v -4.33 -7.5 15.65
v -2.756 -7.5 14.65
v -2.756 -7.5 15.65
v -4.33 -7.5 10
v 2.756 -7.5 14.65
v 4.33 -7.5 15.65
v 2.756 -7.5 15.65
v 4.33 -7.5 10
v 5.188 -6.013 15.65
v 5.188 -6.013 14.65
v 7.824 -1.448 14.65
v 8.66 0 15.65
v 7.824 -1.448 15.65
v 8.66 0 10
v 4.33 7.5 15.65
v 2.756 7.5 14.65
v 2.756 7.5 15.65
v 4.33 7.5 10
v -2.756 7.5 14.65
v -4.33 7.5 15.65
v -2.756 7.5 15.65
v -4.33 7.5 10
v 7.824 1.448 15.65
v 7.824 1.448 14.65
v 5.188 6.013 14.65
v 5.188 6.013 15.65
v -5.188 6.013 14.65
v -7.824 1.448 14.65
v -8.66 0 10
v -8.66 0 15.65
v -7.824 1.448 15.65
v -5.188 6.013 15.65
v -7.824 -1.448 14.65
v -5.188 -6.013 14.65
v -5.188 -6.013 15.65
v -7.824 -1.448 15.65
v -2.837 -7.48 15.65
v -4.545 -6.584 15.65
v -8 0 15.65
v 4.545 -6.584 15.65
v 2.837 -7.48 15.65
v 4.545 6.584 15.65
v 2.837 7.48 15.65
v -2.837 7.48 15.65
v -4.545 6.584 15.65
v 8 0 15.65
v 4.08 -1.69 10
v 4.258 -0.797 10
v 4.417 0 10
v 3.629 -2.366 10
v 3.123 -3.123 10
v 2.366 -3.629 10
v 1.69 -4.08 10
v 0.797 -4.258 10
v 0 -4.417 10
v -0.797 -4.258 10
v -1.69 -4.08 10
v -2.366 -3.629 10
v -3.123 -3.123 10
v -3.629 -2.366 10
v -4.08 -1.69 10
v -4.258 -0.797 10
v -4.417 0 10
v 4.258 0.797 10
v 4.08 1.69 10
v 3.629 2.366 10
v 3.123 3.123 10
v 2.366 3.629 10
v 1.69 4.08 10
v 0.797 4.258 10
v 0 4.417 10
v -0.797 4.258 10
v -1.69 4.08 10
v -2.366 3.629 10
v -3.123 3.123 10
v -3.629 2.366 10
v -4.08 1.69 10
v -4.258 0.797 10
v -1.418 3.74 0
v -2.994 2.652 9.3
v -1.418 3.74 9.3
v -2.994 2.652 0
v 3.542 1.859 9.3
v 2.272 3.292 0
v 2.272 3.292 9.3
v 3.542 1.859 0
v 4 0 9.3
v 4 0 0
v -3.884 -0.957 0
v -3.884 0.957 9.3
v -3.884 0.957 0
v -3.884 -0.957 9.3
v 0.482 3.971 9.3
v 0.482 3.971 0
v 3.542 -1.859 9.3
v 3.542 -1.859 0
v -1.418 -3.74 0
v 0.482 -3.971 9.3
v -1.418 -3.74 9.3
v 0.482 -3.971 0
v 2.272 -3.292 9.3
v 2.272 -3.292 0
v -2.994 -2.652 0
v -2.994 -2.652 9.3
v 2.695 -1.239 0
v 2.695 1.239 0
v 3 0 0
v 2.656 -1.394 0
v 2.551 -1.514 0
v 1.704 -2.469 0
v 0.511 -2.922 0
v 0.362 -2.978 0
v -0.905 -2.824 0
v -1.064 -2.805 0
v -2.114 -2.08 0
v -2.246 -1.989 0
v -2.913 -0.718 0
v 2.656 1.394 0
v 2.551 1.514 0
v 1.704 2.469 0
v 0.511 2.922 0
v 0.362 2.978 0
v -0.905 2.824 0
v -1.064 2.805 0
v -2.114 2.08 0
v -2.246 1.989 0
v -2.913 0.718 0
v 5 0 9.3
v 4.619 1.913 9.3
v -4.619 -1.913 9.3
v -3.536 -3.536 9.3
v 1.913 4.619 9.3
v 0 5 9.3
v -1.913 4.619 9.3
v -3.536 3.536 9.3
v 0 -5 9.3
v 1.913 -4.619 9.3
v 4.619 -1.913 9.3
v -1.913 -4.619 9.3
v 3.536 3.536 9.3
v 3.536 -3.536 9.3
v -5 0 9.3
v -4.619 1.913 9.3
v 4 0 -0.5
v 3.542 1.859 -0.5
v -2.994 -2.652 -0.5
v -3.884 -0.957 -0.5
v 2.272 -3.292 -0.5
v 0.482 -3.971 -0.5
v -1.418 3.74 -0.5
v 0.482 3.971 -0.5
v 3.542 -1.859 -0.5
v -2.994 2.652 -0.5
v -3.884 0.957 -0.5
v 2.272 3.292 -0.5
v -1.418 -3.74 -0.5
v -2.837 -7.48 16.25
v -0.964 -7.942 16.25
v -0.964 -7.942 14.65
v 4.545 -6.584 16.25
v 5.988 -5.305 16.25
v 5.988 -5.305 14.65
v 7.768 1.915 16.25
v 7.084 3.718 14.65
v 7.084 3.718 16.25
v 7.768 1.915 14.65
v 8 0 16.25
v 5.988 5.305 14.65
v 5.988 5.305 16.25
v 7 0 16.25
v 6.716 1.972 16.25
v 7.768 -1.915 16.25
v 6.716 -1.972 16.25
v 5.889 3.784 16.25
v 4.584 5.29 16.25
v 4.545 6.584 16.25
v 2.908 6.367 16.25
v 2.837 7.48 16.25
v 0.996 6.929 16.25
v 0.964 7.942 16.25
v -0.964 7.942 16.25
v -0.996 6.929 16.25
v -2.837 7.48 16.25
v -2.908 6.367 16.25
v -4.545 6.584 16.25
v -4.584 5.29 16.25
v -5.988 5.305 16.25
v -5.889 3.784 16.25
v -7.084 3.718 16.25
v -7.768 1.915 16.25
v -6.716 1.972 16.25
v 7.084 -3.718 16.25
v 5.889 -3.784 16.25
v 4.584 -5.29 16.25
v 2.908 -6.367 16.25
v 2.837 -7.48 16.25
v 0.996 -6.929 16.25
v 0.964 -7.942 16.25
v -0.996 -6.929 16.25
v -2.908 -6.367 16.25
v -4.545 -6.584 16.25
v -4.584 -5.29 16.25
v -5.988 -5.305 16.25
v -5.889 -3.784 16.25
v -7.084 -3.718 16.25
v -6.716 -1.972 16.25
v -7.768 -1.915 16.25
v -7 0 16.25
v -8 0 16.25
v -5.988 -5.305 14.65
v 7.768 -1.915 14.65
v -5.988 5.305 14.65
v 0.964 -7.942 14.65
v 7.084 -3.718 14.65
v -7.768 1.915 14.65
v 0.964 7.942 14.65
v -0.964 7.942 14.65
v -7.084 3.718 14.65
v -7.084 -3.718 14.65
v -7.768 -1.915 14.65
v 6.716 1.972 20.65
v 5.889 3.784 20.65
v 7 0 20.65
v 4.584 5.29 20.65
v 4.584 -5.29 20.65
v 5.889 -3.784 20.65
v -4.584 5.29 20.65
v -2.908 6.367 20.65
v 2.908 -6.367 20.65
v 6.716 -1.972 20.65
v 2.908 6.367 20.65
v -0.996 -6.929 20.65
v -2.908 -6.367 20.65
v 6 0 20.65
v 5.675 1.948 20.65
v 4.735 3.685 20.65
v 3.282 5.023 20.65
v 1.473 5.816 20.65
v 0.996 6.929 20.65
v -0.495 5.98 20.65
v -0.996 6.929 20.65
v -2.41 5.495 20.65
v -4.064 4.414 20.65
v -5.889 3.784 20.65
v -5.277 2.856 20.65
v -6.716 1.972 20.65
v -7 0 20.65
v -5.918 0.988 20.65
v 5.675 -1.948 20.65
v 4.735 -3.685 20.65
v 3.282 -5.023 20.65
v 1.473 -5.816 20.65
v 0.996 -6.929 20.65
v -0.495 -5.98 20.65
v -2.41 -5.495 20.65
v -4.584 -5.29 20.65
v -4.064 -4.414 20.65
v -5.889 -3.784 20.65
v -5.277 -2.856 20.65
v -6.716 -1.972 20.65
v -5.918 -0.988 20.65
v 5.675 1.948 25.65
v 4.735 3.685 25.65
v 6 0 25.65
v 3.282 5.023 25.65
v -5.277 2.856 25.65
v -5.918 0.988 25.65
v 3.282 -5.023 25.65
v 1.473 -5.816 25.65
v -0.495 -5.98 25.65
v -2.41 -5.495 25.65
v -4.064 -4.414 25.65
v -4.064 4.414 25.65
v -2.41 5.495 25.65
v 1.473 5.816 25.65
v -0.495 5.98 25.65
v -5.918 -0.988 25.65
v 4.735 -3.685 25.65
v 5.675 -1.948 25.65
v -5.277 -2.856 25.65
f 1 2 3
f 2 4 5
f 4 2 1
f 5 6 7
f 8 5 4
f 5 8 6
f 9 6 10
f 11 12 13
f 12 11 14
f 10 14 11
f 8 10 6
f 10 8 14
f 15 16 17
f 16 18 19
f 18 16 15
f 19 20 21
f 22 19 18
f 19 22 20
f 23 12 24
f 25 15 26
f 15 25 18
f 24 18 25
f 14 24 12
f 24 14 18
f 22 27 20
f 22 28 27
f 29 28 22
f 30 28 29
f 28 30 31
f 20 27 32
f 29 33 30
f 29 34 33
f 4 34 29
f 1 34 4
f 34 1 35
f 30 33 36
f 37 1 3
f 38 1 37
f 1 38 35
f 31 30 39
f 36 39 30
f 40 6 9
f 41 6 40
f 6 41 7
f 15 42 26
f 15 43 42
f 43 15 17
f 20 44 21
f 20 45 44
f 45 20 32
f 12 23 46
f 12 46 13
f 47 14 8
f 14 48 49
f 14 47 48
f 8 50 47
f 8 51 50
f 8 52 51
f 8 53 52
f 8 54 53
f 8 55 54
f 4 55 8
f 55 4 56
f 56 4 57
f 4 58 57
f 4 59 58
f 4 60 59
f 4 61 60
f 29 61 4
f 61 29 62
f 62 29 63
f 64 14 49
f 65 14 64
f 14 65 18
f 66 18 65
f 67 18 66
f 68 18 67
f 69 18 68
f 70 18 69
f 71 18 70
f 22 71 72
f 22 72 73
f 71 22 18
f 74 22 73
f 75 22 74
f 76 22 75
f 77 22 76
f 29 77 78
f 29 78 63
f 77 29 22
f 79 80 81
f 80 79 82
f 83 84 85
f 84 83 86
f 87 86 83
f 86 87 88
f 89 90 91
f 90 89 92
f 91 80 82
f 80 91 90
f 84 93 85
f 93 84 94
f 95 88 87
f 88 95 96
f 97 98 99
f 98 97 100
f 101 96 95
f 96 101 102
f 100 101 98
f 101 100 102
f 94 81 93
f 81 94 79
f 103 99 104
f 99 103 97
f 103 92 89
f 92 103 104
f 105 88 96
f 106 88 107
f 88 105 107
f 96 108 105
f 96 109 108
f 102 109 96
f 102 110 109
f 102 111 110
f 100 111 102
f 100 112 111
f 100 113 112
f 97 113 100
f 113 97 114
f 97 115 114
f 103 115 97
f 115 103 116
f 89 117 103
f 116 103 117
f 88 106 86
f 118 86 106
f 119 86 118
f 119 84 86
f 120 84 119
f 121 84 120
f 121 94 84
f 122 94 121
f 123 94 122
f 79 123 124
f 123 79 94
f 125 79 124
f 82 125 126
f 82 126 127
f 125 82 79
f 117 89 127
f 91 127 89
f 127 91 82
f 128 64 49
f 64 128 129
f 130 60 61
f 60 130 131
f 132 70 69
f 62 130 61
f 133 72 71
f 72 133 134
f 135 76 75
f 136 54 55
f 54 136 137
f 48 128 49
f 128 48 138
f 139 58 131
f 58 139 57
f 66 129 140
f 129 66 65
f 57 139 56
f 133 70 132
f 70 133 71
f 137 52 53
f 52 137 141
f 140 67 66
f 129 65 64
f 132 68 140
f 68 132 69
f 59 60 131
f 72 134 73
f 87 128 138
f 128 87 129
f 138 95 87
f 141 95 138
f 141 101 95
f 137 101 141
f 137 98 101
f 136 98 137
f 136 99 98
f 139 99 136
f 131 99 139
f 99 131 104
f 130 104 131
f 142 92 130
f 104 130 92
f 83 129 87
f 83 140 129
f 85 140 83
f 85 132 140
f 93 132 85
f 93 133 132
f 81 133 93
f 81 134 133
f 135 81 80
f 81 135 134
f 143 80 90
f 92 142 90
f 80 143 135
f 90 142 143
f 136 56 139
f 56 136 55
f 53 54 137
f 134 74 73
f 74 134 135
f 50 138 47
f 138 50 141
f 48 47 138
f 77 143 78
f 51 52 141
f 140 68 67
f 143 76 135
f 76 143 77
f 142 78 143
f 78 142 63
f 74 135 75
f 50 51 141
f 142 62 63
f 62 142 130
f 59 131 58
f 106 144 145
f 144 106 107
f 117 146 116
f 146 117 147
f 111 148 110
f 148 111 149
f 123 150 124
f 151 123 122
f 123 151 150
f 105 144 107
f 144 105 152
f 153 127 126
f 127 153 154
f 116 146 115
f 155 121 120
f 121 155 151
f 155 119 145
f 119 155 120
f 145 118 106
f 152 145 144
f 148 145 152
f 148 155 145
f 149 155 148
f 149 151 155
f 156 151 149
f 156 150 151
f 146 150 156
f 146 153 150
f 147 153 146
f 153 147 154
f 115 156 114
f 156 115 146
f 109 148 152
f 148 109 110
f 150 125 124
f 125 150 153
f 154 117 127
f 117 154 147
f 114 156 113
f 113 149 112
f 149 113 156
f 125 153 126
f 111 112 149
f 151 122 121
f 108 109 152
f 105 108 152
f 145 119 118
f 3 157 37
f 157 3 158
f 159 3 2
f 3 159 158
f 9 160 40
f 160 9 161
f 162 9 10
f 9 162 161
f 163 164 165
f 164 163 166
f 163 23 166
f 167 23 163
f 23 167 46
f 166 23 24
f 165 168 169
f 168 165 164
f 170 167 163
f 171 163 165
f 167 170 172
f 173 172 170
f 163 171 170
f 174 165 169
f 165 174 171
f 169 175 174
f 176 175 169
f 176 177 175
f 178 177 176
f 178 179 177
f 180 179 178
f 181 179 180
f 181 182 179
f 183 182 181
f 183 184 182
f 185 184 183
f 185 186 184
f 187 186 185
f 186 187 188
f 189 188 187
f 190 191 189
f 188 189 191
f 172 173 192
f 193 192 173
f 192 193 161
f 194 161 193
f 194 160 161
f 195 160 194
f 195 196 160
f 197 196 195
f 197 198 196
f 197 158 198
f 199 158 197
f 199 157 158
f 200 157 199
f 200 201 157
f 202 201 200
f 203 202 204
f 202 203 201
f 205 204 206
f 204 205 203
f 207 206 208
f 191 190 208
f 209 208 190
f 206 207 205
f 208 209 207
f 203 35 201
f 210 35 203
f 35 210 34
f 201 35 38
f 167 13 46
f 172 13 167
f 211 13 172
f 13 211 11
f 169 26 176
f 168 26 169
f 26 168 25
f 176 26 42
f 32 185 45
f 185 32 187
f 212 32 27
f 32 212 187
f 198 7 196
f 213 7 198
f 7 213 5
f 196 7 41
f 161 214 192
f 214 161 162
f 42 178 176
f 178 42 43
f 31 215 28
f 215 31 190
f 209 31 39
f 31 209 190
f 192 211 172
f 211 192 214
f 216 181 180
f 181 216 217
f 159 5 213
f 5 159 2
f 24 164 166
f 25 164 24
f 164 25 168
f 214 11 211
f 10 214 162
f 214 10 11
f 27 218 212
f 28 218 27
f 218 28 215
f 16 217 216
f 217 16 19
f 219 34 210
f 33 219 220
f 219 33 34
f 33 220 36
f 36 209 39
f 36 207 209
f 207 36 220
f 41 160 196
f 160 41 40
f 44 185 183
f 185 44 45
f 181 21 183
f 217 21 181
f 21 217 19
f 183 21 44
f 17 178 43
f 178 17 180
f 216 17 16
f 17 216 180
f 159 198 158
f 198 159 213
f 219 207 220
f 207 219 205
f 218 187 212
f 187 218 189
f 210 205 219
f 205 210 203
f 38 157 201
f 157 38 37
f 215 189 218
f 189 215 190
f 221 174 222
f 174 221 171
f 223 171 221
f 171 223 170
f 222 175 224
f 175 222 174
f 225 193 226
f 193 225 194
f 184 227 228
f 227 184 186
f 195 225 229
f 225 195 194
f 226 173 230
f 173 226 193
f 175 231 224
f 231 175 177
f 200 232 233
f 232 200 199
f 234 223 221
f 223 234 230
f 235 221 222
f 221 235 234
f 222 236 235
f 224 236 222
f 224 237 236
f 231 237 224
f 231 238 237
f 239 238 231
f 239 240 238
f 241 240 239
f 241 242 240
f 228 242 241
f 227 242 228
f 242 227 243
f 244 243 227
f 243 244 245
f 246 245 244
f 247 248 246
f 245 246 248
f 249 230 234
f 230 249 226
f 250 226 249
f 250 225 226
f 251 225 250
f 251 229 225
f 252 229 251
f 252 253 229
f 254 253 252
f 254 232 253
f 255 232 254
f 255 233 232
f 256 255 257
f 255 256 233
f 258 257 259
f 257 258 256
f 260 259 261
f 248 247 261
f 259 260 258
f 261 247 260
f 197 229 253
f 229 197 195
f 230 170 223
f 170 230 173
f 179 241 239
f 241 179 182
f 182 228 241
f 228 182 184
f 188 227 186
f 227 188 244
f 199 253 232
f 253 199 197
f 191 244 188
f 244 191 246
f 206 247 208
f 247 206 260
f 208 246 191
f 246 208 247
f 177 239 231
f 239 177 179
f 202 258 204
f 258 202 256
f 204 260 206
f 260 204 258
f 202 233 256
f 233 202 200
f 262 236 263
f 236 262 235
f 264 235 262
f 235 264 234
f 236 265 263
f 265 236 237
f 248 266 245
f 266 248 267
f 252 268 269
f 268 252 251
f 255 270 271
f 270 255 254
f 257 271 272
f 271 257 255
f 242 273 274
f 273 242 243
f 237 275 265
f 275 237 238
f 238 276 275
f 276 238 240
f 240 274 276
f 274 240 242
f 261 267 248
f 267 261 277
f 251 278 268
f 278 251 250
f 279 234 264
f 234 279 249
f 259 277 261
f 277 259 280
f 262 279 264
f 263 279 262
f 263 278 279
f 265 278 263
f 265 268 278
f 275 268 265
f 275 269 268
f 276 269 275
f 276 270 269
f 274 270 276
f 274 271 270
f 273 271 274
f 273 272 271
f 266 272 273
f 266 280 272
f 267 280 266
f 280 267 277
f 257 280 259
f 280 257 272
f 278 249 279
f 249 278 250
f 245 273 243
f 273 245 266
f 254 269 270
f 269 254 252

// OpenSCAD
// Parameters
shaft_diameter_mm = 8; //[4:16:0.1]
head_across_flats_mm = 15; //[7.5:30:0.1]
head_height_mm = 5.65; //[2.825:11.3:0.05]
length_under_head_mm = 10; //[5:20:0.1]
overlap_mm = 1; //[0.5:2:0.1]
head_to_shank_chamfer_h_mm = 1.2; //[0.6:2.4:0.1]
head_to_shank_chamfer_extra_d_mm = 2; //[1:4:0.1]
tip_chamfer_h_mm = 1.5; //[0.75:3:0.1]
tip_chamfer_end_d_mm = 2; //[0.5:4:0.1]
washer_outer_d_mm = 16; //[8:32:0.1]
washer_thickness_mm = 1.6; //[0.8:3.2:0.1]
pcb_spacer_outer_d_mm = 14; //[7:28:0.1]
pcb_spacer_height_mm = 6; //[3:12:0.1]
buzzer_d_mm = 12; //[6:24:0.1]
buzzer_h_mm = 5; //[2.5:10:0.1]

// Hex Head Screw
module hex_head_screw() {
  union() {
    // Hex Head
    translate([0, 0, length_under_head_mm + head_height_mm / 2])
      cylinder(r=head_across_flats_mm / (2 * cos(30)), h=head_height_mm, center=true, $fn=6);
    
    // Shaft
    translate([0, 0, length_under_head_mm / 2])
      cylinder(r=shaft_diameter_mm / 2, h=length_under_head_mm, center=true);
    
    // Head to Shank Transition
    translate([0, 0, length_under_head_mm - head_to_shank_chamfer_h_mm / 2 + overlap_mm / 2])
      cylinder(r1=(shaft_diameter_mm + head_to_shank_chamfer_extra_d_mm) / 2, r2=shaft_diameter_mm / 2, h=head_to_shank_chamfer_h_mm, center=true);
    
    // Tip Chamfer
    translate([0, 0, tip_chamfer_h_mm / 2 - overlap_mm / 2])
      cylinder(r1=shaft_diameter_mm / 2, r2=tip_chamfer_end_d_mm / 2, h=tip_chamfer_h_mm, center=true);
  }
}

// PCB Spacer
module pcb_spacer() {
  color([0.85, 0.85, 0.8]) {
    translate([0, 0, length_under_head_mm + head_height_mm + pcb_spacer_height_mm / 2 - overlap_mm])
      cylinder(r=pcb_spacer_outer_d_mm / 2, h=pcb_spacer_height_mm, center=true);
  }
}

// Screw and Washer
module screw_and_washer() {
  union() {
    hex_head_screw();
    color("Silver") {
      translate([0, 0, length_under_head_mm + head_height_mm + washer_thickness_mm / 2 - overlap_mm])
        cylinder(r=washer_outer_d_mm / 2, h=washer_thickness_mm, center=true);
    }
  }
}

// Buzzer
module buzzer() {
  color([0.1, 0.1, 0.6]) {
    translate([0, 0, length_under_head_mm + head_height_mm + pcb_spacer_height_mm + buzzer_h_mm / 2 - overlap_mm])
      cylinder(r=buzzer_d_mm / 2, h=buzzer_h_mm, center=true);
  }
}

// Assembly
module assembly() {
  screw_and_washer();
  pcb_spacer();
  buzzer();
}

assembly();
